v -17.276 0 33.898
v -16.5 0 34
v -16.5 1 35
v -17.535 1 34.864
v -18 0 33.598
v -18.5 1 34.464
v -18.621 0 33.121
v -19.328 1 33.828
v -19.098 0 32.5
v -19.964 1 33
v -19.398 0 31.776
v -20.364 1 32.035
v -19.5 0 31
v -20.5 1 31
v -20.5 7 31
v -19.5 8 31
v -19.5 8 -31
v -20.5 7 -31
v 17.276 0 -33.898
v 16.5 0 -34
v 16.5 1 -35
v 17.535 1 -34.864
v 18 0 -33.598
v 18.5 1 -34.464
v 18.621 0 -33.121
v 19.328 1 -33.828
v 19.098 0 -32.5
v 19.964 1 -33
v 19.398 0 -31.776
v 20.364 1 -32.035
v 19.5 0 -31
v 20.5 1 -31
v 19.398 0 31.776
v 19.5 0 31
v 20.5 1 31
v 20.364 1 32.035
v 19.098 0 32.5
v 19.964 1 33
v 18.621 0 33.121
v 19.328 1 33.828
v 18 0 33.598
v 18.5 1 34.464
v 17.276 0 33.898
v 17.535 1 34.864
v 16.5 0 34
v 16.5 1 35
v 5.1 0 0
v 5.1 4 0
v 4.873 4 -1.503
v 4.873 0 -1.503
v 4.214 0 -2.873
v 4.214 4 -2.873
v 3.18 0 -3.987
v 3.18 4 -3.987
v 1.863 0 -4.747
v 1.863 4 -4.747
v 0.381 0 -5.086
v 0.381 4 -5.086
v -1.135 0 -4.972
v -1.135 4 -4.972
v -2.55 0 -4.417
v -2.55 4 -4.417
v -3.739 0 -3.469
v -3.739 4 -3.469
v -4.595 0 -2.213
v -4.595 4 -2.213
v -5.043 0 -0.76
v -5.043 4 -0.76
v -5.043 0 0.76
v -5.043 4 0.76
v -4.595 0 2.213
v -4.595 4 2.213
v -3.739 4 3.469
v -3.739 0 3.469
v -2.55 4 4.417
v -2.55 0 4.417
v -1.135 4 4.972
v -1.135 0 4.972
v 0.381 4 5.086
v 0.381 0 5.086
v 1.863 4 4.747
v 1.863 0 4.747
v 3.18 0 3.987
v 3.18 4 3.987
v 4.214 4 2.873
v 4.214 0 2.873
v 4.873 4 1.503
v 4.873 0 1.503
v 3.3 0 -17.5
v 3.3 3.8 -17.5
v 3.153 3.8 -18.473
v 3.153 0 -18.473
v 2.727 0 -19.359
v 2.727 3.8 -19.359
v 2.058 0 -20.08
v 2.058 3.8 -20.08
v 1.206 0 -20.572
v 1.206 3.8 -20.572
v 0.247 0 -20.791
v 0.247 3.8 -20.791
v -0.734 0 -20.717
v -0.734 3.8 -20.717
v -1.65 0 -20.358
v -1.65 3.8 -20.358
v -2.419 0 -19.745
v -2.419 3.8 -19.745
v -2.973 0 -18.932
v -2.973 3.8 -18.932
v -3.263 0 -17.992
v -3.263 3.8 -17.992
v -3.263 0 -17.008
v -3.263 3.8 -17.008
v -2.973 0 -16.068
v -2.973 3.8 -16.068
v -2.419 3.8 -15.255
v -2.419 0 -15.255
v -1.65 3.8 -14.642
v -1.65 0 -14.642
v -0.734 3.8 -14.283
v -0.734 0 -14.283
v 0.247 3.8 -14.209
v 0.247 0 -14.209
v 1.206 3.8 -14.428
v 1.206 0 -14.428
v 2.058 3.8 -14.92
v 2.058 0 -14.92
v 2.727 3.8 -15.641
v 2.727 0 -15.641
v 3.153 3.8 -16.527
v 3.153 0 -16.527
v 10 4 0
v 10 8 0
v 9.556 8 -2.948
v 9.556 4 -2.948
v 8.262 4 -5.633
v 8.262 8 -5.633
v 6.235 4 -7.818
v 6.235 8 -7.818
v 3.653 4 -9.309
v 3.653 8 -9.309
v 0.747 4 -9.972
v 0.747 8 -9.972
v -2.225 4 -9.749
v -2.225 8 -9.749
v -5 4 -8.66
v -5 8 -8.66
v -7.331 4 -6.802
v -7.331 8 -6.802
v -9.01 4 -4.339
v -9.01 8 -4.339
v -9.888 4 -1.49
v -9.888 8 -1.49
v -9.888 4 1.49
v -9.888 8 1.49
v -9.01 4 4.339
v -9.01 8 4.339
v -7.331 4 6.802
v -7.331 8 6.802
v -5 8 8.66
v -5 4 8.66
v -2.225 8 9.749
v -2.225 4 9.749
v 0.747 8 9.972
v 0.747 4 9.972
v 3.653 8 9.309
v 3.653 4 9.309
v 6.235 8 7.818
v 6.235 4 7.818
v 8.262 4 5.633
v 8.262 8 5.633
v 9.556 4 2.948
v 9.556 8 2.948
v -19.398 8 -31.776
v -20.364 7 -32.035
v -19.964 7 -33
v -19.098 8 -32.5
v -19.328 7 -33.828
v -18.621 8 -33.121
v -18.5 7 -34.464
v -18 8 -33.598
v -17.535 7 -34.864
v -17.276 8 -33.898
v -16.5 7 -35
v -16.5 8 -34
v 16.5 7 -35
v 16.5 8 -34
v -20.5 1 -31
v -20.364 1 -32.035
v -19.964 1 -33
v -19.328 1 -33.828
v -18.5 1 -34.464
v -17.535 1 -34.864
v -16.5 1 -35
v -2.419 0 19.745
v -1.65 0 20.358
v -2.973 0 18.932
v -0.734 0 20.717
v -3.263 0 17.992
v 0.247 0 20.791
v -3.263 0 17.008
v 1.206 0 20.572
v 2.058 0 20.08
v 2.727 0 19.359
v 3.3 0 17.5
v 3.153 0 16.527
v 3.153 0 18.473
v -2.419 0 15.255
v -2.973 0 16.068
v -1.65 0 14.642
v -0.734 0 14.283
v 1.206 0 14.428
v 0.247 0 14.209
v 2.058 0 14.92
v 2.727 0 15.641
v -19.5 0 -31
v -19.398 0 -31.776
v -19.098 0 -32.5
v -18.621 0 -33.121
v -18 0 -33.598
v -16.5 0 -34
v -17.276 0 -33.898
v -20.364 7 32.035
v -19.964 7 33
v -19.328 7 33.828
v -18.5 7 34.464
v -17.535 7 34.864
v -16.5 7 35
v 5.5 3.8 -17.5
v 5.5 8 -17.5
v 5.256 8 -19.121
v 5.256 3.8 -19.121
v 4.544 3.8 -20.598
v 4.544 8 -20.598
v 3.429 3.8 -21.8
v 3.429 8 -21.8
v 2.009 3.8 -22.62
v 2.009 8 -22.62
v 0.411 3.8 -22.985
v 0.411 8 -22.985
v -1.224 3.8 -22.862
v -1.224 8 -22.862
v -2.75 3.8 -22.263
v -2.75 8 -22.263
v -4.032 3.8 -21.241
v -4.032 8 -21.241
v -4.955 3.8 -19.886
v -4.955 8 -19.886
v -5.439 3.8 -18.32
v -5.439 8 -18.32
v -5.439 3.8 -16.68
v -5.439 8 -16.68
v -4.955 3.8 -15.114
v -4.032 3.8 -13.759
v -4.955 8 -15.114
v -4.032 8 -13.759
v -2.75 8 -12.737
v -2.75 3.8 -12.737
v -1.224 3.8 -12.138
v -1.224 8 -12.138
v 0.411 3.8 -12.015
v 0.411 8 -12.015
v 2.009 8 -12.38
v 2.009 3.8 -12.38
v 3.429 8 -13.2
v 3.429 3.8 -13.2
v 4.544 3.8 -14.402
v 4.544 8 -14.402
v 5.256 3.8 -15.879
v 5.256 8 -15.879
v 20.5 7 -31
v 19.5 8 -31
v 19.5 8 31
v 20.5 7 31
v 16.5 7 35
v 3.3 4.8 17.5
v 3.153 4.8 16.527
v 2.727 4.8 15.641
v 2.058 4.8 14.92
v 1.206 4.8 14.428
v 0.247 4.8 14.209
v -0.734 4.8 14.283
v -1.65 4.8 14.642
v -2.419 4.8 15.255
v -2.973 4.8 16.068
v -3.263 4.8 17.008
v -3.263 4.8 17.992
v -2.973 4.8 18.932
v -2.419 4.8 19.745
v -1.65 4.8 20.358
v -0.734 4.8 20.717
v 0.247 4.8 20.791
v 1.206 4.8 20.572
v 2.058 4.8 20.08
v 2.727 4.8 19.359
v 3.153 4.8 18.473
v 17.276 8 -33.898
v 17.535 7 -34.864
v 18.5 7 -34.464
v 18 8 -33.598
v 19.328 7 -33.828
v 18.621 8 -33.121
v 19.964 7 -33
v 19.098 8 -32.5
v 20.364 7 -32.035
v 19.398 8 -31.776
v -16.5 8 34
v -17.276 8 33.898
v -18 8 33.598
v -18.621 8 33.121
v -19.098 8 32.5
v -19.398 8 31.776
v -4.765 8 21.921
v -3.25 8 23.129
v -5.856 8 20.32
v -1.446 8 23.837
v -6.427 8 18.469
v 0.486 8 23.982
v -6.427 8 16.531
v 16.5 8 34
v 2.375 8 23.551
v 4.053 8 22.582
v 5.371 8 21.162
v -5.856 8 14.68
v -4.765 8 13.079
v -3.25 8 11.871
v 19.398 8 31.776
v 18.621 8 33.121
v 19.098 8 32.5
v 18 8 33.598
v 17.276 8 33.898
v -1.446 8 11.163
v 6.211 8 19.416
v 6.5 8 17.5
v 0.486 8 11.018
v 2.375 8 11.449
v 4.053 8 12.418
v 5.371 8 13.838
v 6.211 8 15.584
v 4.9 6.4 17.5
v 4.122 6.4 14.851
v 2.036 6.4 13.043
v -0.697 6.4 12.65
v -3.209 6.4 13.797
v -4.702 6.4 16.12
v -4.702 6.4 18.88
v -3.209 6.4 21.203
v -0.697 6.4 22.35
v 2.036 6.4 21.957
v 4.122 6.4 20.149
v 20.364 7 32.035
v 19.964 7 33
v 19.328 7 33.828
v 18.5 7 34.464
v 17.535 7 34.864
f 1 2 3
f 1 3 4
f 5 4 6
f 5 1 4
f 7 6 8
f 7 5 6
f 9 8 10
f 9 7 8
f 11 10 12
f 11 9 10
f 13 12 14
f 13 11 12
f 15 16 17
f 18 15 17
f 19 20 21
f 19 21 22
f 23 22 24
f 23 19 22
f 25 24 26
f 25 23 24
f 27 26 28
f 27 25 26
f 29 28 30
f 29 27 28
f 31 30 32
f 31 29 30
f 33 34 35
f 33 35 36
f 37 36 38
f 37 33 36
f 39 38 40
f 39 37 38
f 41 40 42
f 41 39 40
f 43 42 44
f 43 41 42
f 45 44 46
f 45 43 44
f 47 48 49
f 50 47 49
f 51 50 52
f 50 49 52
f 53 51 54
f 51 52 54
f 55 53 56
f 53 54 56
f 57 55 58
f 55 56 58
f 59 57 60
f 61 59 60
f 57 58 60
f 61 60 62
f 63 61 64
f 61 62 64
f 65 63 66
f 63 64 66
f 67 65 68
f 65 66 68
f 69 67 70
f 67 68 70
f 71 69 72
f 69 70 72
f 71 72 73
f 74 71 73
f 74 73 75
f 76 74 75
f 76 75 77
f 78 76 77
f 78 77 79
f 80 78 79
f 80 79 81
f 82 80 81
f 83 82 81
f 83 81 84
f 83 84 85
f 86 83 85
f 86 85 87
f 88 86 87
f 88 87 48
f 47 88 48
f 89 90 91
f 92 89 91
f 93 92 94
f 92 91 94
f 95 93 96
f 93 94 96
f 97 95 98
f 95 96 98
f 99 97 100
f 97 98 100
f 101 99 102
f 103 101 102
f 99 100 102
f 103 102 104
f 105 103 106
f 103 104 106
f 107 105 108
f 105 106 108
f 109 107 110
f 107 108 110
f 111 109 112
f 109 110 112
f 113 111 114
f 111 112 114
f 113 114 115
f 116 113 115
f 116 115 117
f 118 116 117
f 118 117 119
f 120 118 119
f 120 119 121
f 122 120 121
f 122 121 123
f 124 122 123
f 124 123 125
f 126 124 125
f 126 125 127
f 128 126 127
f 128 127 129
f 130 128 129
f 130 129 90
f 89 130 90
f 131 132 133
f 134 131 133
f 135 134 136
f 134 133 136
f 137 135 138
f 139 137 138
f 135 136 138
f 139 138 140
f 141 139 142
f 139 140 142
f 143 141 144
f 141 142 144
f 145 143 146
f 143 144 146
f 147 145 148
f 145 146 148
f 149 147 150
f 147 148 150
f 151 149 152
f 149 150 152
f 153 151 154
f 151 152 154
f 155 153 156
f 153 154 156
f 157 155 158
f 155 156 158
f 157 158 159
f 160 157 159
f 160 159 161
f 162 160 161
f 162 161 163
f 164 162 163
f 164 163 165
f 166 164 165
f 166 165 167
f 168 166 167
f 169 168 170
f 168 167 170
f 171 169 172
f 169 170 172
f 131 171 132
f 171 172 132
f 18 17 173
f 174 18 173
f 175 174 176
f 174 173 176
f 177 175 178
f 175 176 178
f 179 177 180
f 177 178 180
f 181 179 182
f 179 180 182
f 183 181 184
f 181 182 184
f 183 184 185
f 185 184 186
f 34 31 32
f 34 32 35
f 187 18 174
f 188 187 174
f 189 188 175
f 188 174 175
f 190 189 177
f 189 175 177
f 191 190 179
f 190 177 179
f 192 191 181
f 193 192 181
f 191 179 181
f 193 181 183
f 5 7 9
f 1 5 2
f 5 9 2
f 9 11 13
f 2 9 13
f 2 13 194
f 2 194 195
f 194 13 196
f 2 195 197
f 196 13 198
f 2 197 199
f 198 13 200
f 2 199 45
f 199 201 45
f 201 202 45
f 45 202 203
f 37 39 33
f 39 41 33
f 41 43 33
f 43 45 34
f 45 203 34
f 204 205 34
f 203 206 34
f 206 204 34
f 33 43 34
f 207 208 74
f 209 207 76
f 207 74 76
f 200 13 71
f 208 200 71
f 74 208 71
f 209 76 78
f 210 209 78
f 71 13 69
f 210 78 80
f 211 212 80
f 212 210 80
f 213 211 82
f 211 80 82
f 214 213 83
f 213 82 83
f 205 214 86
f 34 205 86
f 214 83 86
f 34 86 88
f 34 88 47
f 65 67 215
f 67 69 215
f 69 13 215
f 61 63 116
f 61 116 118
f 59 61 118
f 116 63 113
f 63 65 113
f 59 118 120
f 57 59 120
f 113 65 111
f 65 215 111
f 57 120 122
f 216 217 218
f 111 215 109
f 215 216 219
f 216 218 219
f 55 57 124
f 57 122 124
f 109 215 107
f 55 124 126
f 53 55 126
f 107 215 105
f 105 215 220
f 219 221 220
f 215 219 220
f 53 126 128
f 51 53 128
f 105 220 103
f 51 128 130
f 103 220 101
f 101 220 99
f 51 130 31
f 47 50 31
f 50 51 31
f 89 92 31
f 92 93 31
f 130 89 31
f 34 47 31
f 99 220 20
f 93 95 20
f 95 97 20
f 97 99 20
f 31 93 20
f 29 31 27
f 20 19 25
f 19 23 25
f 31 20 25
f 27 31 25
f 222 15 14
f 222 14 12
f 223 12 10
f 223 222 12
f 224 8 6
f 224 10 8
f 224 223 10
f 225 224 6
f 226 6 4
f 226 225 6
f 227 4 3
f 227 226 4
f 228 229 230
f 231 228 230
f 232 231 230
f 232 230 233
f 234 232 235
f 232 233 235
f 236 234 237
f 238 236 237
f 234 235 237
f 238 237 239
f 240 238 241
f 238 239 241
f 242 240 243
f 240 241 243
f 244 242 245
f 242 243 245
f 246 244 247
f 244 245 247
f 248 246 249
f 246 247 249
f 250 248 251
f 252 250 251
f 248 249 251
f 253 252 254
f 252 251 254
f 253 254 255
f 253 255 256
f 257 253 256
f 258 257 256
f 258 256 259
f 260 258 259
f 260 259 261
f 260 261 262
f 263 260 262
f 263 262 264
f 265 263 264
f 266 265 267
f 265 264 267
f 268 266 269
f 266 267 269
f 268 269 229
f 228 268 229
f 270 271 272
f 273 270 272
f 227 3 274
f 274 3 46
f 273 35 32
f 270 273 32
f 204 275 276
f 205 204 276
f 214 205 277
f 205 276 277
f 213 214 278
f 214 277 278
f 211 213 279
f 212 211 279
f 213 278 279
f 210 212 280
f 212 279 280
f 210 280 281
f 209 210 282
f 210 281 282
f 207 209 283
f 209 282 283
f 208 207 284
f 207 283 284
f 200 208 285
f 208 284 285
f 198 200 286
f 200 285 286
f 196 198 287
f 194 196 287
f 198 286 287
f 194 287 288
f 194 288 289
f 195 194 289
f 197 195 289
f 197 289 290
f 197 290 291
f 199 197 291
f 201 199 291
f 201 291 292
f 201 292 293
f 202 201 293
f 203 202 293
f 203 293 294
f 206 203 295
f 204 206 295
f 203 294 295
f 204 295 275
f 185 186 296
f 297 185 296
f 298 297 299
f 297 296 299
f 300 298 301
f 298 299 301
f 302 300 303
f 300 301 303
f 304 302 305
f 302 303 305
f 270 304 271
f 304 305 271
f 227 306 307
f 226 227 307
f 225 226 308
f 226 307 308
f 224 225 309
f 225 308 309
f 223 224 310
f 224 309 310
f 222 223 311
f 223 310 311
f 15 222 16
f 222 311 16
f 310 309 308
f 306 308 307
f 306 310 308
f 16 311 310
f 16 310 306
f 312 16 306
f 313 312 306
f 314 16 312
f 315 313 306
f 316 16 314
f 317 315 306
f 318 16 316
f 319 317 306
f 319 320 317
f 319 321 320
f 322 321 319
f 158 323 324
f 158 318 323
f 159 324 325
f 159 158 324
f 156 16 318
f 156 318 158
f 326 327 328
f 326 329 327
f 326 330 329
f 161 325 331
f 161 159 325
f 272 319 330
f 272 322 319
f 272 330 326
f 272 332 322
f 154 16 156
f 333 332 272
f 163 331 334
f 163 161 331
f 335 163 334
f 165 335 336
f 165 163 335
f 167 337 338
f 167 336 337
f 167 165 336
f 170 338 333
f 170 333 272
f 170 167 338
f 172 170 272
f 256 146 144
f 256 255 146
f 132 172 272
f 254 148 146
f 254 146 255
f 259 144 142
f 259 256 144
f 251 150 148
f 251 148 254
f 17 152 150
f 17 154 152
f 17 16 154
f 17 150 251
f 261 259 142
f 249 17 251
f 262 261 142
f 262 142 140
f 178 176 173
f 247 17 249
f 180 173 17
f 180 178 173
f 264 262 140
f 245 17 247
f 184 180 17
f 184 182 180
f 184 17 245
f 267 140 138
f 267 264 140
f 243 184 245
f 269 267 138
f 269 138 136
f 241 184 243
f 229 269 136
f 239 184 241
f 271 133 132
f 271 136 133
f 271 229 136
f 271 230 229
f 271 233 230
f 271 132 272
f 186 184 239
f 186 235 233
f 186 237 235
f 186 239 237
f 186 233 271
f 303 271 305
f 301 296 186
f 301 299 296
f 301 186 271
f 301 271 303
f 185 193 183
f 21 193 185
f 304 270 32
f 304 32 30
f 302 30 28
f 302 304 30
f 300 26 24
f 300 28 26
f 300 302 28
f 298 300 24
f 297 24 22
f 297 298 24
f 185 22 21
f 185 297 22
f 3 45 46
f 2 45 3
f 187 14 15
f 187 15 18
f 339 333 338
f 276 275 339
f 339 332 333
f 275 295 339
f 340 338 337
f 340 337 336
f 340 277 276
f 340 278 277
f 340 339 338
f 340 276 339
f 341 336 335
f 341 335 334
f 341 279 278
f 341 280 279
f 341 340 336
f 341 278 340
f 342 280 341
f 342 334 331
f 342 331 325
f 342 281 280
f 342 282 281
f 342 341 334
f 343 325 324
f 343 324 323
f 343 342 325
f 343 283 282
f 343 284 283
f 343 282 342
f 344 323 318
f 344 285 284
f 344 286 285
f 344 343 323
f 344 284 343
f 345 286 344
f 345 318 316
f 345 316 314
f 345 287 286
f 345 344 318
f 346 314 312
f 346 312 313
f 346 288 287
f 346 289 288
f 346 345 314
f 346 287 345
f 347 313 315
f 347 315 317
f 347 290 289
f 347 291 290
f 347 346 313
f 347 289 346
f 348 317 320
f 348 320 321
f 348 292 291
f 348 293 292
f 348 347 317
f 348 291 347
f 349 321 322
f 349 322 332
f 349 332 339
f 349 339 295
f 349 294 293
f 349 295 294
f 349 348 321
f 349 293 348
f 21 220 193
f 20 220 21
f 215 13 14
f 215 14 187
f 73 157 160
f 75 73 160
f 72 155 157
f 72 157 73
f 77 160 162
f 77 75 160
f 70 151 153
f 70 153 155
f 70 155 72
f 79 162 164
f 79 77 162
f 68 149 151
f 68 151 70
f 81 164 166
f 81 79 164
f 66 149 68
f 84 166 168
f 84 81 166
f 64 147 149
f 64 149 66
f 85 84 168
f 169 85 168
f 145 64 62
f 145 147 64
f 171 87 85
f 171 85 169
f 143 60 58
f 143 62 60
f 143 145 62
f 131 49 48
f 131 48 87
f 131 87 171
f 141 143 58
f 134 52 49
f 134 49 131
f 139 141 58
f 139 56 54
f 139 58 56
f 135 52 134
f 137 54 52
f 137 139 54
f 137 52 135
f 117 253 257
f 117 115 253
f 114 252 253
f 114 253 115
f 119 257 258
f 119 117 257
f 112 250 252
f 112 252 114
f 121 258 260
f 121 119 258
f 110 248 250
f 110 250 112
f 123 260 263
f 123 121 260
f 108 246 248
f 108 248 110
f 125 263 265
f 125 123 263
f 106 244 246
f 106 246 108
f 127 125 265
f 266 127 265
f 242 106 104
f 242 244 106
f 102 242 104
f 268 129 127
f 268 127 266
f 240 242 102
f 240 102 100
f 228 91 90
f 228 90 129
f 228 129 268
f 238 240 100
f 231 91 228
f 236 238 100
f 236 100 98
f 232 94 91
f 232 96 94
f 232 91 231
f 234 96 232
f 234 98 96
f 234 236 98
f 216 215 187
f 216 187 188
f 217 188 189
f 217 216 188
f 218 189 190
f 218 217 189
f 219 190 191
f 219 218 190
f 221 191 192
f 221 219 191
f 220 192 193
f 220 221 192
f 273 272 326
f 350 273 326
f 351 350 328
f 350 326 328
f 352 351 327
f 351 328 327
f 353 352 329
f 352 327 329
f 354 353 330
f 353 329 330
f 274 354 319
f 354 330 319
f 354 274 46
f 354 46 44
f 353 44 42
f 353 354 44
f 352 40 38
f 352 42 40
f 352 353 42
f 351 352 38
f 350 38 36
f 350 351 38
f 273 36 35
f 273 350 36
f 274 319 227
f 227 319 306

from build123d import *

# Parameters (mm, degrees)
SKETCH1_W           = 41
SKETCH1_H           = 70
BOSS_EXTRUDE1_DEPTH = 8
FILLET1_R           = 4
CHAMFER1_SIZE       = 1
SKETCH2_R           = 3.3
CUT_EXTRUDE1_DEPTH  = 8
CHAMFER2_SIZE       = 3.2
SKETCH3_R           = 5.5
CUT_EXTRUDE2_DEPTH  = 4.2
SKETCH4_R           = 5.1
CUT_EXTRUDE3_DEPTH  = 10
SKETCH5_R           = 10
CUT_EXTRUDE5_DEPTH  = 4


with BuildPart() as part:
    # Sketch1 → Boss-Extrude1 (new body)
    with BuildSketch(Plane(origin=(0, 0, 0), x_dir=(1, 0, 0), z_dir=(0, 1, 0))):
        Rectangle(SKETCH1_W, SKETCH1_H)
    extrude(amount=BOSS_EXTRUDE1_DEPTH)

    # Fillet1
    fillet1_edges = [part.edges().sort_by_distance(p)[0] for p in [
        (20.5, 4, 35),
        (-20.5, 4, 35),
        (-20.5, 4, -35),
        (20.5, 4, -35),
    ]]
    fillet(fillet1_edges, radius=FILLET1_R)

    # Chamfer1
    chamfer1_edges = [part.edges().sort_by_distance(p)[0] for p in [
        (-20.5, 0, 0),
        (-20.5, 8, 0),
        (20.5, 0, 0),
        (0, 0, 35),
        (0, 0, -35),
        (-19.328427125, 0, 33.828427125),
        (19.328427125, 0, 33.828427125),
        (19.328427125, 0, -33.828427125),
        (-19.328427125, 0, -33.828427125),
        (0, 8, -35),
        (20.5, 8, 0),
        (0, 8, 35),
        (-19.328427125, 8, 33.828427125),
        (19.328427125, 8, 33.828427125),
        (19.328427125, 8, -33.828427125),
        (-19.328427125, 8, -33.828427125),
    ]]
    chamfer(chamfer1_edges, length=CHAMFER1_SIZE)

    # Sketch2 → Cut-Extrude1 (cut)
    with BuildSketch(Plane(origin=(0, 8, 0), x_dir=(1, 0, 0), z_dir=(0, 1, 0))):
        with Locations((0, -17.5)):
            Circle(SKETCH2_R)
        with Locations((0, 17.5)):
            Circle(SKETCH2_R)
    extrude(amount=-CUT_EXTRUDE1_DEPTH, mode=Mode.SUBTRACT)

    # Chamfer2
    chamfer2_edges = [part.edges().sort_by_distance(p)[0] for p in [
        (-3.3, 8, 17.5),
    ]]
    chamfer(chamfer2_edges, length=CHAMFER2_SIZE)

    # Sketch3 → Cut-Extrude2 (cut)
    with BuildSketch(Plane(origin=(0, 8, 0), x_dir=(1, 0, 0), z_dir=(0, 1, 0))):
        with Locations((0, 17.5)):
            Circle(SKETCH3_R)
    extrude(amount=-CUT_EXTRUDE2_DEPTH, mode=Mode.SUBTRACT)

    # Sketch4 → Cut-Extrude3 (cut)
    with BuildSketch(Plane(origin=(0, 8, 0), x_dir=(1, 0, 0), z_dir=(0, 1, 0))):
        Circle(SKETCH4_R)
    extrude(amount=-CUT_EXTRUDE3_DEPTH, mode=Mode.SUBTRACT)

    # Sketch5 → Cut-Extrude5 (cut)
    with BuildSketch(Plane(origin=(0, 8, 0), x_dir=(1, 0, 0), z_dir=(0, 1, 0))):
        Circle(SKETCH5_R)
    extrude(amount=-CUT_EXTRUDE5_DEPTH, mode=Mode.SUBTRACT)


solid = part.part
